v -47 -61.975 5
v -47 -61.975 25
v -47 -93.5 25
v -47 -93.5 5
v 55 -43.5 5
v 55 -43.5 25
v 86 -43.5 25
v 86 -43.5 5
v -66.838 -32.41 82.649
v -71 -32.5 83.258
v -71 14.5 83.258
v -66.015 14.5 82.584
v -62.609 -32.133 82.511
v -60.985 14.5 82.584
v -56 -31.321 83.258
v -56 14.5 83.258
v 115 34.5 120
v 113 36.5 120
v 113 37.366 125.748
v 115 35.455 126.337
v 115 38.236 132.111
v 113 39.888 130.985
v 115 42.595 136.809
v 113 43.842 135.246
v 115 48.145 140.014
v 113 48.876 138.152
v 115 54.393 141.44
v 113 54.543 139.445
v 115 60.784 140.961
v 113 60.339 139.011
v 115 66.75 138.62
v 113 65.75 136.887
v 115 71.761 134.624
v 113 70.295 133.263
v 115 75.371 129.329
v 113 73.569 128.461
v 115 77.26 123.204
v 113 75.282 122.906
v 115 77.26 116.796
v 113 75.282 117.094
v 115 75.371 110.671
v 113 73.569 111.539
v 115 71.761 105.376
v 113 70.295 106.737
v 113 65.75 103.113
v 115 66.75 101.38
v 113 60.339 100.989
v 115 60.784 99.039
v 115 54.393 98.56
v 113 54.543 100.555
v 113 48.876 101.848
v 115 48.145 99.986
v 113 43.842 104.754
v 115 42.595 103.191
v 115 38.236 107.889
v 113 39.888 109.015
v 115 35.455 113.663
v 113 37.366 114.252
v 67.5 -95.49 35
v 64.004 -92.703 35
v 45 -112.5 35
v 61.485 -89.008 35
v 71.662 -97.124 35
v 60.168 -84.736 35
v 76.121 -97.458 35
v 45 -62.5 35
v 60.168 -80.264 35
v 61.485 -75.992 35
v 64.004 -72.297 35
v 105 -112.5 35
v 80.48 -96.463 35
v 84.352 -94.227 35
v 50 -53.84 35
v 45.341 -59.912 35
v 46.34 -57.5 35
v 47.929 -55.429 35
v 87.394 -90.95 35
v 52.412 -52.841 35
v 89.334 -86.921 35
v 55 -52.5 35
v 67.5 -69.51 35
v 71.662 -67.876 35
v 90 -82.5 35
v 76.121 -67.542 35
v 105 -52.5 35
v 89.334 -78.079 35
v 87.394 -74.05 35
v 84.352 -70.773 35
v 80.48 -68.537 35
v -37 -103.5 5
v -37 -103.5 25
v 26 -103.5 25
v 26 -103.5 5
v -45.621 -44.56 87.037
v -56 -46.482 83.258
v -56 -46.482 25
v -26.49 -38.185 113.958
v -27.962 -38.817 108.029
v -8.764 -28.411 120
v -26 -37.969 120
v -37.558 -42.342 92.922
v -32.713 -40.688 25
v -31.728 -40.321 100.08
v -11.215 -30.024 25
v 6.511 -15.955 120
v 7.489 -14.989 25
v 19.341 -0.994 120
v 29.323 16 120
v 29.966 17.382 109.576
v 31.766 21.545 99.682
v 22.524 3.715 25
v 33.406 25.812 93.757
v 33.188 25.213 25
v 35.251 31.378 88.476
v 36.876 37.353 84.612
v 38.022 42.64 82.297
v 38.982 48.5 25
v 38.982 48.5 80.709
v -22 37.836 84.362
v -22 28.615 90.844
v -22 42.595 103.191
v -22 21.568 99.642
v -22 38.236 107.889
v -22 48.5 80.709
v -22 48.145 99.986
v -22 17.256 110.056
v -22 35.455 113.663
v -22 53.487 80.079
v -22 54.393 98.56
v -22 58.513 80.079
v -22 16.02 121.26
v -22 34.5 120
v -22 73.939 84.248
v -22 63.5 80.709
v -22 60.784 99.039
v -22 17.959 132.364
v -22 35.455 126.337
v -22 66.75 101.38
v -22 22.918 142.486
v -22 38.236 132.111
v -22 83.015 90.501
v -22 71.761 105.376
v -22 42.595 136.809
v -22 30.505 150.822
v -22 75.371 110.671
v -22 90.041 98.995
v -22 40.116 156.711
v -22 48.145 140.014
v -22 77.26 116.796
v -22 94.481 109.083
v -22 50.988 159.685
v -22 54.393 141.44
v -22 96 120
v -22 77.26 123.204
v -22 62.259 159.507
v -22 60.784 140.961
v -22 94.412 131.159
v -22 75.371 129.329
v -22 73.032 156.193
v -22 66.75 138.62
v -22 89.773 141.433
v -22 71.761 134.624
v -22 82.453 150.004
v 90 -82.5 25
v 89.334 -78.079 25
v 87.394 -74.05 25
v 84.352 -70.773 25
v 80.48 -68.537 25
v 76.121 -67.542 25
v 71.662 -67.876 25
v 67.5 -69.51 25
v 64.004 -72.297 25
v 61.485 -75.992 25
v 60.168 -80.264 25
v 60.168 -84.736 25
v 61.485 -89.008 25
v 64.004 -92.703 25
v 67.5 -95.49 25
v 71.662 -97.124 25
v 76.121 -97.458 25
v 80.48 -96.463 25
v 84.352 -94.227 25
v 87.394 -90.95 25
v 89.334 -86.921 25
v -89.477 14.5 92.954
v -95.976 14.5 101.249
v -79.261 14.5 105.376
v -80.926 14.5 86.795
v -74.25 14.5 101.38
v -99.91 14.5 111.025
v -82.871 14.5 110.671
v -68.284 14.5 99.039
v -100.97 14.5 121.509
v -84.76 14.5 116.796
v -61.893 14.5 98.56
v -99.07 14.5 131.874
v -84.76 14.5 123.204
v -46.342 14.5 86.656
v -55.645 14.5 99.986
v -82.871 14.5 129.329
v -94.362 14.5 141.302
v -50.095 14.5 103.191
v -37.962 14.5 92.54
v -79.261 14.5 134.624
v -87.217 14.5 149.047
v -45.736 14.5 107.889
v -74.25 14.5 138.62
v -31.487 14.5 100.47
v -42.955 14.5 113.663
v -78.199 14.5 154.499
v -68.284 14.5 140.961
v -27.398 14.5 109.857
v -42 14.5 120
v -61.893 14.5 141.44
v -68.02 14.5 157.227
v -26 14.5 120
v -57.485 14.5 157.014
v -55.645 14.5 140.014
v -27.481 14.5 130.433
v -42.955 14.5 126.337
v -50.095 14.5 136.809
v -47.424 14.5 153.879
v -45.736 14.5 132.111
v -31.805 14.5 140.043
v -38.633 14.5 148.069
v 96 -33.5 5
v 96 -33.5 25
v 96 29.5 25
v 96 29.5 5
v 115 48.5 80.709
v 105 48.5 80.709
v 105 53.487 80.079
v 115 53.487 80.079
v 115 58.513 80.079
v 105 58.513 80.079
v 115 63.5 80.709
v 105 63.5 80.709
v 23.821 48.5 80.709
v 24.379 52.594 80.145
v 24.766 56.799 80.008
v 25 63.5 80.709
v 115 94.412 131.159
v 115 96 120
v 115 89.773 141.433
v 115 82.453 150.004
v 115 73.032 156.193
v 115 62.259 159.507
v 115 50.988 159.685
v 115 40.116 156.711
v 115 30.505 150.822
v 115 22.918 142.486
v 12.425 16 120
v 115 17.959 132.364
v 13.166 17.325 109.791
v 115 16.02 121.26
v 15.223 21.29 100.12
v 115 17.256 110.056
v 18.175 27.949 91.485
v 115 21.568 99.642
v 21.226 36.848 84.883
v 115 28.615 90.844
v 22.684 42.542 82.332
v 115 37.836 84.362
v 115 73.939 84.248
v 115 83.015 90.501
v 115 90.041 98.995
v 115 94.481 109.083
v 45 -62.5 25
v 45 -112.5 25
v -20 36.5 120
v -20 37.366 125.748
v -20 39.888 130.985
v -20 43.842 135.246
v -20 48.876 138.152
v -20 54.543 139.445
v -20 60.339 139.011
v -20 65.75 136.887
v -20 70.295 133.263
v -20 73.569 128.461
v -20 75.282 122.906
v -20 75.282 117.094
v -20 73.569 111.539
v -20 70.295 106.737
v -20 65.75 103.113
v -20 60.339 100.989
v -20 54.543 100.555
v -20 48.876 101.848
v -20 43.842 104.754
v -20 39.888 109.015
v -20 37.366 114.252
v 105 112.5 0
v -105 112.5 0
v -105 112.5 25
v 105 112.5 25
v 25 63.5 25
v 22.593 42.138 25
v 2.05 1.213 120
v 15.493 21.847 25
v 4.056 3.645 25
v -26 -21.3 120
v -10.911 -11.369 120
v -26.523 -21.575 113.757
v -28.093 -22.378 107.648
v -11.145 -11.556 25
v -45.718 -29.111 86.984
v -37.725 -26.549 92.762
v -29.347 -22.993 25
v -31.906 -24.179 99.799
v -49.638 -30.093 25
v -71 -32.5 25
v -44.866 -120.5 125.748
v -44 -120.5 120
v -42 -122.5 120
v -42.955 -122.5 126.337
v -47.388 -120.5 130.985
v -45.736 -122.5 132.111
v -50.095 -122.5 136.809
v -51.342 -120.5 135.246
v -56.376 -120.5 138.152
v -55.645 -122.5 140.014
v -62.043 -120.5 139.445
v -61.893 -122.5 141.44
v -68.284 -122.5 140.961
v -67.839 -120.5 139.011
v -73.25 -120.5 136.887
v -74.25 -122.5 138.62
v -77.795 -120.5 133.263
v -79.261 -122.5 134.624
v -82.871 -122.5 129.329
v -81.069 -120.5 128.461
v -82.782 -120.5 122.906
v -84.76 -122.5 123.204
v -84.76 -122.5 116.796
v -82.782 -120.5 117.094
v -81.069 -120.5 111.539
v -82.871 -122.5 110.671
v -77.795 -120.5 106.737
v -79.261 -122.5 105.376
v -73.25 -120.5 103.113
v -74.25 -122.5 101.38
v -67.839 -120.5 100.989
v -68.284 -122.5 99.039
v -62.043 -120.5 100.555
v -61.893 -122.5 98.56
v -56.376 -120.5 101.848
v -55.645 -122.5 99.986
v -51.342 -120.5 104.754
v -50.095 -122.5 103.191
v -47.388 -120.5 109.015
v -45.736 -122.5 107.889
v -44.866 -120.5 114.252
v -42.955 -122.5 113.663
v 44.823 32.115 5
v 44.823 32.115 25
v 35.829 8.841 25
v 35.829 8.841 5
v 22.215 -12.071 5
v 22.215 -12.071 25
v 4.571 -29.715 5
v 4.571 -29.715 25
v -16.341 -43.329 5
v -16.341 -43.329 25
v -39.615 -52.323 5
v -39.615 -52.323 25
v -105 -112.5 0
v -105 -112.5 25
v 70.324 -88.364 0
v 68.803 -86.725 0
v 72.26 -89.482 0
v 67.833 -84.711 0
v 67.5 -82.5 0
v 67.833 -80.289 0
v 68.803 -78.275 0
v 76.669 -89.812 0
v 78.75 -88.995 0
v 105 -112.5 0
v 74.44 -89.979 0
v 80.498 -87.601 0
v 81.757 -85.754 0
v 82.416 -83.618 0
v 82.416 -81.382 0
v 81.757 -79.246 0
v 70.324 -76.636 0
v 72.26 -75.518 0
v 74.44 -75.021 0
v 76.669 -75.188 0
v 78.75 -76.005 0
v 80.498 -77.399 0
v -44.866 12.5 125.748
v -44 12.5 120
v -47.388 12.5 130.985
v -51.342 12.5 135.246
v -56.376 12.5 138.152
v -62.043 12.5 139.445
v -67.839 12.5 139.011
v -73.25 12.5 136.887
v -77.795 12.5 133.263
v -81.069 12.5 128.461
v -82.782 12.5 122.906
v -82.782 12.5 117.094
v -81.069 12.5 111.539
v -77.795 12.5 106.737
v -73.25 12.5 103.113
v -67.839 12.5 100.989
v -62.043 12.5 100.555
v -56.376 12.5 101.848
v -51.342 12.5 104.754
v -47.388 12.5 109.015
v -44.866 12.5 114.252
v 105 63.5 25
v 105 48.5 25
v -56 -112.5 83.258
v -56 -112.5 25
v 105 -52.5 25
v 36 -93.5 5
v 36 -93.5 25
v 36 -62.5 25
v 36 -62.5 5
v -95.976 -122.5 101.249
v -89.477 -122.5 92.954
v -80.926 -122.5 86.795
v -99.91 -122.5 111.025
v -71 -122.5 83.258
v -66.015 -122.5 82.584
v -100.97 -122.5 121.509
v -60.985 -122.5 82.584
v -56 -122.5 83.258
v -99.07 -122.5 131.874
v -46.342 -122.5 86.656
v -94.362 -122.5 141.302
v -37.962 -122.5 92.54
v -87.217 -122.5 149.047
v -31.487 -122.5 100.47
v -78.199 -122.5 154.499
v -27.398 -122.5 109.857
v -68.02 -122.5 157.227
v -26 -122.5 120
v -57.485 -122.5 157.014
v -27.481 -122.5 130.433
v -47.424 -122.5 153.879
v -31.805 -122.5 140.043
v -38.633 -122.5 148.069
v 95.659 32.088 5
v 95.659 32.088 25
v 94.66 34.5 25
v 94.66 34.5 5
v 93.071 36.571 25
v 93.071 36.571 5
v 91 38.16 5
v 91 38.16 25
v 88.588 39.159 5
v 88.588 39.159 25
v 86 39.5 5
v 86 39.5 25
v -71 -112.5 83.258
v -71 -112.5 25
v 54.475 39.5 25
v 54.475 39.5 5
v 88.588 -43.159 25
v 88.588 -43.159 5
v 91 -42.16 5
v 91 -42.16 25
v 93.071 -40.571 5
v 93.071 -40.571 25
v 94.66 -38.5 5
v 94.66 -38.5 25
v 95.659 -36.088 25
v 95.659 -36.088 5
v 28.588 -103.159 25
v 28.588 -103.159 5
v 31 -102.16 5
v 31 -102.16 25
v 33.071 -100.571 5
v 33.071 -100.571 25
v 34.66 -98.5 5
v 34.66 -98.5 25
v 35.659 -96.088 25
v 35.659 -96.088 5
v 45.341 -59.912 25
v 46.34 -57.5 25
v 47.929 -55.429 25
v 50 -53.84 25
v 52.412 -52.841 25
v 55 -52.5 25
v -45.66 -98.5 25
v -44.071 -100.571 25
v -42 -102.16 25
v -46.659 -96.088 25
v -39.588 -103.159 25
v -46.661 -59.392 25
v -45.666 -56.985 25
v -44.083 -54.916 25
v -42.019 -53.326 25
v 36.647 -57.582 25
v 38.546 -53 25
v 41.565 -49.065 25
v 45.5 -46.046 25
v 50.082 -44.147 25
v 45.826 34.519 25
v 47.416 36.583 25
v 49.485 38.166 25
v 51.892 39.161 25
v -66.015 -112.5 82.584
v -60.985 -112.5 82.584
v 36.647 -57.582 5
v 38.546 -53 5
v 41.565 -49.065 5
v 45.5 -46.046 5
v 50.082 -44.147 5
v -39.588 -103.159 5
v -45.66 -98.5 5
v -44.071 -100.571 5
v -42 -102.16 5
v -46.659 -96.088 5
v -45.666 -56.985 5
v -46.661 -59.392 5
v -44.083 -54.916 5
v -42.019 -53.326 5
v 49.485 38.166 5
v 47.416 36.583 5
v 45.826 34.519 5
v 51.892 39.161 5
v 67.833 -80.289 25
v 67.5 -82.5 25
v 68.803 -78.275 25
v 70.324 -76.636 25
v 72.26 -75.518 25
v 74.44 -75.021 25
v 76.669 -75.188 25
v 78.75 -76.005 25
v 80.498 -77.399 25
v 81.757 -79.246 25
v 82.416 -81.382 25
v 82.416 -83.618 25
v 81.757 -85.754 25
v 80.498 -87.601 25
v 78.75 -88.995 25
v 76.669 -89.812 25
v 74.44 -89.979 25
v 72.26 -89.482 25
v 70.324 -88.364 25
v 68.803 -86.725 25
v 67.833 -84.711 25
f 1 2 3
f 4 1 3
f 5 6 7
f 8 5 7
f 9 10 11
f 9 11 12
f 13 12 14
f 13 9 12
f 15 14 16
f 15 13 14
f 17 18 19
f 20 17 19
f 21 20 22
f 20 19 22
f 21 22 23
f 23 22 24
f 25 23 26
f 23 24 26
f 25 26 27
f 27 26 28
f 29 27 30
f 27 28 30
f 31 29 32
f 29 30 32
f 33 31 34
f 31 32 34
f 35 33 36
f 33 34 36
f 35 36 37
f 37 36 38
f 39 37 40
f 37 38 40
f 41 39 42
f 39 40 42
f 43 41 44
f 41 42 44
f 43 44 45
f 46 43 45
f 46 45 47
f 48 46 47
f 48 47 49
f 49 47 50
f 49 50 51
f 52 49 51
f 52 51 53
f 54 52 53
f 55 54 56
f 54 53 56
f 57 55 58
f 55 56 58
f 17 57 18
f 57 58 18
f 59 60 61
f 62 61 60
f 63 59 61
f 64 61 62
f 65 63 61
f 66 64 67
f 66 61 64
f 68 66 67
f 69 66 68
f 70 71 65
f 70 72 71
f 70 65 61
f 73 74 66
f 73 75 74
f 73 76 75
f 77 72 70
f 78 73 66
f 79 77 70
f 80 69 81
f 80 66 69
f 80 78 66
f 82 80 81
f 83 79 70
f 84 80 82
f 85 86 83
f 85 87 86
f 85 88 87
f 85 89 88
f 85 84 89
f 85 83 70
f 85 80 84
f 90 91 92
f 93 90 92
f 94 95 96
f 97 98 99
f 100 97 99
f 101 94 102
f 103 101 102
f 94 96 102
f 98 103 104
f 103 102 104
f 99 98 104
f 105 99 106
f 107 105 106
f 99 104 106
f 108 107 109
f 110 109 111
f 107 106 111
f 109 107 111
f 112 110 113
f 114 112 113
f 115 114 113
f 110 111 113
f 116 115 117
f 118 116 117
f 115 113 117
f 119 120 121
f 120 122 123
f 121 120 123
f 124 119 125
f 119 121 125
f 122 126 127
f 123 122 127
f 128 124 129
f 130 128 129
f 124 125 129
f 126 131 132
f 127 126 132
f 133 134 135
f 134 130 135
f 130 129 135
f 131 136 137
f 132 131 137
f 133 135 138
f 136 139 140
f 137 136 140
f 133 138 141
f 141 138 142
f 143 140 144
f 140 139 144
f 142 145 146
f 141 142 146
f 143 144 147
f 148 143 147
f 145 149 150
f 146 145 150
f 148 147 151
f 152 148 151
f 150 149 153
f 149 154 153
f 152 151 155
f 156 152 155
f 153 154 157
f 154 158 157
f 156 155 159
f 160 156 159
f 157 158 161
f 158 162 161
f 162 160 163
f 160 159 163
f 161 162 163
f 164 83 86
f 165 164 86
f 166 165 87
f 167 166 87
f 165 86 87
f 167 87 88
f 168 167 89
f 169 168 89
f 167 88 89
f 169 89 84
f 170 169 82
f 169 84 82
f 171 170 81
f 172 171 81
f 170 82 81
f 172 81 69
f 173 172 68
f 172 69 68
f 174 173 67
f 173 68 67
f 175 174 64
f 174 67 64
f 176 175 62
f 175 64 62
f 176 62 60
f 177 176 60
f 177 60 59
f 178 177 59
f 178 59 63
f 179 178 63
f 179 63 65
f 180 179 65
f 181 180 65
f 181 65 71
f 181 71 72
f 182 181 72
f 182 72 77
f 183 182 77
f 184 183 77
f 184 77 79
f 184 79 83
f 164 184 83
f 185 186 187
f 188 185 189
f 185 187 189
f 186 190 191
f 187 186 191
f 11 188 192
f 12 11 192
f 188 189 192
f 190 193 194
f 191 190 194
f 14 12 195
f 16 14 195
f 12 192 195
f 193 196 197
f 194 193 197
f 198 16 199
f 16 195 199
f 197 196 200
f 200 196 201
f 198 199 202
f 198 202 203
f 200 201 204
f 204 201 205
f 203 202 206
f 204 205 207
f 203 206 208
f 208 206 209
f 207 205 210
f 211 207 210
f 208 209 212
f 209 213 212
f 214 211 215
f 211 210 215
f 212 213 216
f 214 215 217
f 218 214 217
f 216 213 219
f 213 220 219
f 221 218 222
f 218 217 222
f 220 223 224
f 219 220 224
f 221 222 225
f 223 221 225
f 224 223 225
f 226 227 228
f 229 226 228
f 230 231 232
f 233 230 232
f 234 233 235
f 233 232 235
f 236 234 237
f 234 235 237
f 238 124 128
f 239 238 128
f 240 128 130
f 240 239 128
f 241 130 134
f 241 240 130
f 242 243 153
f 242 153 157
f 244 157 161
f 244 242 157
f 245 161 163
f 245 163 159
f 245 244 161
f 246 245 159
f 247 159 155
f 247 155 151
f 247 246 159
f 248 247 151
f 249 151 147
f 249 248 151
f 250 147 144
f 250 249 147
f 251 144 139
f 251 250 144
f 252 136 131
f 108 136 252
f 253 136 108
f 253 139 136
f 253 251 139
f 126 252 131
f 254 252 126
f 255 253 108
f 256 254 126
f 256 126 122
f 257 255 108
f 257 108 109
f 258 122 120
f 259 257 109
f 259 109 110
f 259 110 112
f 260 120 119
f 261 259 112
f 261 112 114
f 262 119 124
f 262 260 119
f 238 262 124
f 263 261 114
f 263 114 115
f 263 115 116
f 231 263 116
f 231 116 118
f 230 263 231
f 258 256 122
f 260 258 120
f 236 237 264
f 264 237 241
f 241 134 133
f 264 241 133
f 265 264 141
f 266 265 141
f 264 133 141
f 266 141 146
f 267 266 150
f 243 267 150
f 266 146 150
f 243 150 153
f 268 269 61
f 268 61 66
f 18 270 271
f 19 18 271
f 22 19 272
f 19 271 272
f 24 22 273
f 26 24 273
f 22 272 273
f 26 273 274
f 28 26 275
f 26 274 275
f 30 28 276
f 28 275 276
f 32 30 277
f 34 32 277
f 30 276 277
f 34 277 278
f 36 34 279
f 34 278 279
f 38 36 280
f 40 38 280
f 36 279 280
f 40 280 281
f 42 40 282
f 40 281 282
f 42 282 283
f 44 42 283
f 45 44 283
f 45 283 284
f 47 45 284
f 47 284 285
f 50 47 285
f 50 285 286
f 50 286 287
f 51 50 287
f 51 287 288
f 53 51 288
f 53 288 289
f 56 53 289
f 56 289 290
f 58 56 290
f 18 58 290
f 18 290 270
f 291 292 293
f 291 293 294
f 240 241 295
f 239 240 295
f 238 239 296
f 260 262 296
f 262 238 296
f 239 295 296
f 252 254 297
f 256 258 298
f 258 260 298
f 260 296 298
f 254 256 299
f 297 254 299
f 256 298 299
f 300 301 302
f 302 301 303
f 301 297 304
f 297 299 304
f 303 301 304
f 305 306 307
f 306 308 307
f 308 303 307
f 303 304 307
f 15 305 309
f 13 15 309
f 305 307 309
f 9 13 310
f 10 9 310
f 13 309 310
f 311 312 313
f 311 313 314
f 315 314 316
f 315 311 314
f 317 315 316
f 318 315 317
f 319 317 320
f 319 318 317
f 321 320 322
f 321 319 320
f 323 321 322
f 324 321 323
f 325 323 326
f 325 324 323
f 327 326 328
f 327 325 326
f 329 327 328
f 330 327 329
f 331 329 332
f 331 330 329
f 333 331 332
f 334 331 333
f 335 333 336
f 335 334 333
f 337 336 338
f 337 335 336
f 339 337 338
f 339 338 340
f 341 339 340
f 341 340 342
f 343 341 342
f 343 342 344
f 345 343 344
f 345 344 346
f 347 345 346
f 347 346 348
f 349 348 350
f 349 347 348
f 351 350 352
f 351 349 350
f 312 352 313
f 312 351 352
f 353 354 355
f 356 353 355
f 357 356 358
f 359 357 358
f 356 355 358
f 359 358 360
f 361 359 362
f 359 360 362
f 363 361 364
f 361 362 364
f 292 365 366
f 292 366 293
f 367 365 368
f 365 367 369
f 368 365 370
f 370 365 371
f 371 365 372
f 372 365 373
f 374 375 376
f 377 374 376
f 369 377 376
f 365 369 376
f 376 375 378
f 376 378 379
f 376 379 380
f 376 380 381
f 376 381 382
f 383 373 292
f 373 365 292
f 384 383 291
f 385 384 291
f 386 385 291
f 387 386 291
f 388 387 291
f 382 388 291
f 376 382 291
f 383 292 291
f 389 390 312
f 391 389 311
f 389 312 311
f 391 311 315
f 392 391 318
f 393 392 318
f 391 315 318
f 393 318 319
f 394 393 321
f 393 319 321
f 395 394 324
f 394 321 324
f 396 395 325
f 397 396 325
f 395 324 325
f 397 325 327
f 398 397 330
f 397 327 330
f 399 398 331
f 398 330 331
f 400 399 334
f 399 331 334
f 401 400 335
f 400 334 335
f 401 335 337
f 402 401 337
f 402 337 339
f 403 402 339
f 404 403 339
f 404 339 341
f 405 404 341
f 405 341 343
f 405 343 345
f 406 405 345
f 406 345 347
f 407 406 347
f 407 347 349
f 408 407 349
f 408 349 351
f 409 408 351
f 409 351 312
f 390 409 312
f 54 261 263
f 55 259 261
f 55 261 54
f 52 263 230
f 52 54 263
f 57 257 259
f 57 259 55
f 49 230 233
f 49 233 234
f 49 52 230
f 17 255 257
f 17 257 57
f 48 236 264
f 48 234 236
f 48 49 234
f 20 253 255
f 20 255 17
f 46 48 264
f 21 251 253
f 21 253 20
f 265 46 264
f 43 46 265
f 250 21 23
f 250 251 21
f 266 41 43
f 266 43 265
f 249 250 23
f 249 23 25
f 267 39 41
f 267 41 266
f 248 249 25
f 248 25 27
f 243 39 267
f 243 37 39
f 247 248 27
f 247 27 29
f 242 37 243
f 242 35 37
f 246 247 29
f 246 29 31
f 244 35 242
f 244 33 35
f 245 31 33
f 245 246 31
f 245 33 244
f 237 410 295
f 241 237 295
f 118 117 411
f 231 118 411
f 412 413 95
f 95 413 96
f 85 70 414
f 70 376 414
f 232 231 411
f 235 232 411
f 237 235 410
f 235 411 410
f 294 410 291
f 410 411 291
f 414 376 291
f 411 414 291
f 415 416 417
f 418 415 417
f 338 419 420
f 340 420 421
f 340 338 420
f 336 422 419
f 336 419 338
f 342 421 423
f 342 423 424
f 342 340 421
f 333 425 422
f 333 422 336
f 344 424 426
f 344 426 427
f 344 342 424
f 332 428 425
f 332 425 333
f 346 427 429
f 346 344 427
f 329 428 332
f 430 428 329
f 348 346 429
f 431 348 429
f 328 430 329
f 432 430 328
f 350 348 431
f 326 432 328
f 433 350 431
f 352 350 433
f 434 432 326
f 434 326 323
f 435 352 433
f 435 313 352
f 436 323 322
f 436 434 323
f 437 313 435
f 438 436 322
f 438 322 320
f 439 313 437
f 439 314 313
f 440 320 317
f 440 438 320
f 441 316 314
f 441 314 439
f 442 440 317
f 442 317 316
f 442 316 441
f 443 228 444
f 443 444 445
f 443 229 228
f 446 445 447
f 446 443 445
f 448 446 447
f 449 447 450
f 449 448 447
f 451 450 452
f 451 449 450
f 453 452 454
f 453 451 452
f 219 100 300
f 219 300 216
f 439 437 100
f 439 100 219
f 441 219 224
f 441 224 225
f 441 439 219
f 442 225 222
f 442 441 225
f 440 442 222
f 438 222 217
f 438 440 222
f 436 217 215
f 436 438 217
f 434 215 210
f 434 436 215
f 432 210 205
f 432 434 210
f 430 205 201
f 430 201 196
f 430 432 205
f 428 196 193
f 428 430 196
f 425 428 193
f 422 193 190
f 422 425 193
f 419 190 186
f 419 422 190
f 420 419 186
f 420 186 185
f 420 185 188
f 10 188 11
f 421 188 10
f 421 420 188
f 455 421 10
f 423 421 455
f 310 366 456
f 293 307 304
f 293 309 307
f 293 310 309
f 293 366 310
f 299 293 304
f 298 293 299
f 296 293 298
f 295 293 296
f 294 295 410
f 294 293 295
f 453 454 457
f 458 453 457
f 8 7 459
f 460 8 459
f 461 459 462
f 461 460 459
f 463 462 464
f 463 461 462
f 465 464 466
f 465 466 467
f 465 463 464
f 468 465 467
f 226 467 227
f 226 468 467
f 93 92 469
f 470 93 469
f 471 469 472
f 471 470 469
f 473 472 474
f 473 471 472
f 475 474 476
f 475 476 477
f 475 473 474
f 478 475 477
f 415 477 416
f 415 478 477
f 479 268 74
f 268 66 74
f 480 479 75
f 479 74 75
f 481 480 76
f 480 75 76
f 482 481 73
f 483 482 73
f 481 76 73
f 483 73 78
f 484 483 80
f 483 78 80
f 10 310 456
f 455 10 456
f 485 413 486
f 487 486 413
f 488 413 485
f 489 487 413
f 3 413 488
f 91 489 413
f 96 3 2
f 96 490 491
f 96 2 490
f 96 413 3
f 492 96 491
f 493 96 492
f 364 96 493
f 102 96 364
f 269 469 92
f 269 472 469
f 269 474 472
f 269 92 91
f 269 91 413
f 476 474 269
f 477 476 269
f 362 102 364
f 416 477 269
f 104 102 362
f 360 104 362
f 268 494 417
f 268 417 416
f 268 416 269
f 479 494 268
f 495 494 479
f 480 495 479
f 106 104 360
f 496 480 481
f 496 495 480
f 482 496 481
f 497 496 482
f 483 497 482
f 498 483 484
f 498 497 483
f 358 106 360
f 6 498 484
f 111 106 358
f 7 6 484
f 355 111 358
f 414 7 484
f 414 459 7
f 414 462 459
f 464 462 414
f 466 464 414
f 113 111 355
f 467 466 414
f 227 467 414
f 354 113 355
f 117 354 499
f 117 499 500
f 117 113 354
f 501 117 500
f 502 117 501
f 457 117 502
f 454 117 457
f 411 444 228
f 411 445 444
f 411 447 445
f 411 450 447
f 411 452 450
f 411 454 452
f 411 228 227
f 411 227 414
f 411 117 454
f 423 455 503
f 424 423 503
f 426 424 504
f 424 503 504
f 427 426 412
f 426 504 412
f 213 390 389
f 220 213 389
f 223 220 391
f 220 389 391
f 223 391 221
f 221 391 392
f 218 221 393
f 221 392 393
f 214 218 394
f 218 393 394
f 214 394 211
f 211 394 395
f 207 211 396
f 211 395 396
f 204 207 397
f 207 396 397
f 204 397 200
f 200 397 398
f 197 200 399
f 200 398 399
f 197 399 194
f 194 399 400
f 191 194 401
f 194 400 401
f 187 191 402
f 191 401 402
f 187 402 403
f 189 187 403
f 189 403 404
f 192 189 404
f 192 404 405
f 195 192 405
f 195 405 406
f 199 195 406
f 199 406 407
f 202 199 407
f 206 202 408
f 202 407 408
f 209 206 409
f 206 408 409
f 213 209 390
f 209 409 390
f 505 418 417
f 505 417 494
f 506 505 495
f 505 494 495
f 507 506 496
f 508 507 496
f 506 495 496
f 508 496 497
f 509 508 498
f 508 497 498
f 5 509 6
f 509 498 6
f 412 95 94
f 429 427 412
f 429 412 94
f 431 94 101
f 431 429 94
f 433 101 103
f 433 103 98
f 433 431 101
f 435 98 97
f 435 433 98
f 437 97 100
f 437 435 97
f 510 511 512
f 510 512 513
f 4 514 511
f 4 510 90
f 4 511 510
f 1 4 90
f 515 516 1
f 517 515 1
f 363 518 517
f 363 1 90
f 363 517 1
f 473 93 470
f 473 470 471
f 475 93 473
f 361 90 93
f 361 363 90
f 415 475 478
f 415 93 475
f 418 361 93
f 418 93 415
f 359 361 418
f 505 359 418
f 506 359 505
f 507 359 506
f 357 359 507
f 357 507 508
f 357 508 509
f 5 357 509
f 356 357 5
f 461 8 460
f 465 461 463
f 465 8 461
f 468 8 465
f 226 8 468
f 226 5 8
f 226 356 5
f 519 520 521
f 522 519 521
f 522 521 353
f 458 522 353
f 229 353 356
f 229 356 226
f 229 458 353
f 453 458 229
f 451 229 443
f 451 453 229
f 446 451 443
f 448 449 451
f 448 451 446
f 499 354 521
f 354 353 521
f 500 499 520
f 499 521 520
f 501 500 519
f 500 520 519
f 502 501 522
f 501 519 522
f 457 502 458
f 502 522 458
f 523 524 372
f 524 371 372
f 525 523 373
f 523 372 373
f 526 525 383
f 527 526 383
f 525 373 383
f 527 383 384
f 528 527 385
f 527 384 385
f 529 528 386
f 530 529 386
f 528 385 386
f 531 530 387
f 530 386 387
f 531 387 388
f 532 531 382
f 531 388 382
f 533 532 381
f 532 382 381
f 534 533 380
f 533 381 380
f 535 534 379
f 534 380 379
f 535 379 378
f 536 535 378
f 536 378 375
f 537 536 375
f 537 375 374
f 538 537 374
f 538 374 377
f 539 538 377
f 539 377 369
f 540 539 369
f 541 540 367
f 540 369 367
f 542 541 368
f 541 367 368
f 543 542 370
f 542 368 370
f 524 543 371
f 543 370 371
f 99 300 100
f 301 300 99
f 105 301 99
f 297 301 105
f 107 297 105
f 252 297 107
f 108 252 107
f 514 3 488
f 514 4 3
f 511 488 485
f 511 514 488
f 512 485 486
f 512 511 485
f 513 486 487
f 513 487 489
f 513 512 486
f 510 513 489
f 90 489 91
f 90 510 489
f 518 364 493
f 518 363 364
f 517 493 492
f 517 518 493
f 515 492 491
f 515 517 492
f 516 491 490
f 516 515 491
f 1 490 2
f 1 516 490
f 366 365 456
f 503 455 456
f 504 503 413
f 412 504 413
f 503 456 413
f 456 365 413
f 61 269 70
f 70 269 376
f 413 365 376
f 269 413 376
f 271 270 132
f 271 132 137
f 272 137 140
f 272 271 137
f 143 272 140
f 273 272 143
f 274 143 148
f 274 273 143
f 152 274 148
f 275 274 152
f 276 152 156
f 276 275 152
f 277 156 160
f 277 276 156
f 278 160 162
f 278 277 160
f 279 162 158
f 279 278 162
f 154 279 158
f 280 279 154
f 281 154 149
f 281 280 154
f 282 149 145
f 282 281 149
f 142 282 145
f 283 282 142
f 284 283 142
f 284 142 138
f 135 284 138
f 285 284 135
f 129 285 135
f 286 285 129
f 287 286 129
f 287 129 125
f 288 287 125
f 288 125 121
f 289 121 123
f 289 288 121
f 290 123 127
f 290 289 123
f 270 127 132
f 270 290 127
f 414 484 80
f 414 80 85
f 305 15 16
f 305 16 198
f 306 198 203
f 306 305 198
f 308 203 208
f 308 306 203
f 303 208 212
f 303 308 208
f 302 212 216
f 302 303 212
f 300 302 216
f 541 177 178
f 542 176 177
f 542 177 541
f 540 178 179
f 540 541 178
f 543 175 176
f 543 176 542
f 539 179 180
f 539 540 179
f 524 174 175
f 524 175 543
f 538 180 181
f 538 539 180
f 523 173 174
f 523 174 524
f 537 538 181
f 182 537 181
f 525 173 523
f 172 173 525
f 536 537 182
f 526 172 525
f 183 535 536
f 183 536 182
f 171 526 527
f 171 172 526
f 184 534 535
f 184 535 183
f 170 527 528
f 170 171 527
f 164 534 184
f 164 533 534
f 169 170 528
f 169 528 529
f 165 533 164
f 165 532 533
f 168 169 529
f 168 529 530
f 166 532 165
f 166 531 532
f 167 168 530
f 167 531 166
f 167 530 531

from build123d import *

# Parameters (mm, degrees)
F0_W            = 210
F0_H            = 225
F1_DEPTH        = 25
F3_DEPTH        = 95
F5_DEPTH        = 10
F5_DEPTH_BACK   = 127
F7_DEPTH        = 10
F7_DEPTH_BACK   = 127
F8_W            = 60
F8_H            = 60
F9_DEPTH        = 10
F10_R           = 10
F12_DEPTH       = 20
F14_D           = 15
F14_CBORE_D     = 30
F14_CBORE_DEPTH = 10
F15_R           = 10
F16_R           = 19.5
F17_DEPTH       = 235.001
F18_R           = 19.5
F19_DEPTH       = 137.0010001
F20_SIZE        = 2


with BuildPart() as f1:
    # F0 (on Top) → F1 (new body)
    with BuildSketch(Plane.XY):
        Rectangle(F0_W, F0_H)
    extrude(amount=F1_DEPTH)

    # F2 (on face) → F3 (join)
    with BuildSketch(Plane.XY.offset(25)):
        with BuildLine():
            Line((-71, -32.5), (-71, -112.5))
            Line((-71, -112.5), (-56, -112.5))
            Line((-56, -112.5), (-56, -46.4818166789))
            ThreePointArc((-56, -46.4818166789), (7.4888527117, -14.9888527117), (38.9818166789, 48.5))
            Line((38.9818166789, 48.5), (105, 48.5))
            Line((105, 48.5), (105, 63.5))
            Line((105, 63.5), (25, 63.5))
            ThreePointArc((25, 63.5), (-3.1177490061, -4.3822509939), (-71, -32.5))
        make_face()
    extrude(amount=F3_DEPTH)

    # F4 (on face) → F5 (join, two sides)
    with BuildSketch(Plane.XZ.offset(112.5)) as f5_sk:
        with BuildLine():
            ThreePointArc((-56, 83.2576538583), (-34.4526249034, 96.2829175487), (-26, 120))
            ThreePointArc((-26, 120), (-87.2170824513, 149.0473750966), (-71, 83.2576538583))
            Line((-71, 83.2576538583), (-71, 120))
            Line((-71, 120), (-56, 120))
            Line((-56, 120), (-56, 83.2576538583))
        make_face()
        with BuildLine():
            Line((-71, 120), (-71, 83.2576538583))
            ThreePointArc((-71, 83.2576538583), (-63.5, 82.5), (-56, 83.2576538583))
            Line((-56, 83.2576538583), (-56, 120))
            Line((-56, 120), (-71, 120))
        make_face()
    extrude(amount=F5_DEPTH)
    extrude(f5_sk.sketch, amount=-F5_DEPTH_BACK)

    # F6 (on face) → F7 (join, two sides)
    with BuildSketch(Plane.YZ.offset(105)) as f7_sk:
        with BuildLine():
            ThreePointArc((63.5, 80.7094158862), (86.8220700148, 94.504902432), (96, 120))
            ThreePointArc((96, 120), (30.504902432, 150.8220700148), (48.5, 80.7094158862))
            Line((48.5, 80.7094158862), (48.5, 120))
            Line((48.5, 120), (63.5, 120))
            Line((63.5, 120), (63.5, 80.7094158862))
        make_face()
        with BuildLine():
            Line((48.5, 120), (48.5, 80.7094158862))
            ThreePointArc((48.5, 80.7094158862), (56, 80), (63.5, 80.7094158862))
            Line((63.5, 80.7094158862), (63.5, 120))
            Line((63.5, 120), (48.5, 120))
        make_face()
    extrude(amount=F7_DEPTH)
    extrude(f7_sk.sketch, amount=-F7_DEPTH_BACK)

    # F8 (on face) → F9 (join)
    with BuildSketch(Plane.XY.offset(25)):
        with Locations((75, -82.5)):
            Rectangle(F8_W, F8_H)
    extrude(amount=F9_DEPTH)

    # F10
    f10_edges = [f1.edges().sort_by_distance(p)[0] for p in [
        (45, -52.5, 30),
    ]]
    fillet(f10_edges, radius=F10_R)

    # F11 (on face) → F12 (cut)
    with BuildSketch(Plane.XY.offset(25)):
        with BuildLine():
            ThreePointArc((46.5755076536, 39.5), (13.8528137424, -21.3528137424), (-47, -54.0755076536))
            Line((-47, -54.0755076536), (-47, -103.5))
            Line((-47, -103.5), (36, -103.5))
            Line((36, -103.5), (36, -62.5))
            ThreePointArc((36, -62.5), (41.5649711575, -49.0649711575), (55, -43.5))
            Line((55, -43.5), (96, -43.5))
            Line((96, -43.5), (96, 39.5))
            Line((96, 39.5), (46.5755076536, 39.5))
        make_face()
    extrude(amount=-F12_DEPTH, mode=Mode.SUBTRACT)

    # F14 (through all)
    with Locations(Plane.XY.offset(35)):
        with Locations((75, -82.5)):
            CounterBoreHole(F14_D / 2, F14_CBORE_D / 2, F14_CBORE_DEPTH)

    # F15
    f15_edges = [f1.edges().sort_by_distance(p)[0] for p in [
        (-47, -54.075508, 15),
        (-47, -103.5, 15),
        (36, -103.5, 15),
        (46.575508, 39.5, 15),
        (96, 39.5, 15),
        (96, -43.5, 15),
    ]]
    fillet(f15_edges, radius=F15_R)

    # F16 (on face) → F17 (cut, through all)
    with BuildSketch(Plane.XZ.offset(122.5)):
        with Locations((-63.5, 120)):
            Circle(F16_R)
    extrude(amount=-F17_DEPTH, mode=Mode.SUBTRACT)

    # F18 (on face) → F19 (cut, through all)
    with BuildSketch(Plane(origin=(-22, 0, 0), x_dir=(0, -1, 0), z_dir=(-1, 0, 0))):
        with Locations((-56, 120)):
            Circle(F18_R)
    extrude(amount=-F19_DEPTH, mode=Mode.SUBTRACT)

    # F20
    f20_edges = [f1.edges().sort_by_distance(p)[0] for p in [
        (-22, 75.5, 120),
        (-83, 14.5, 120),
        (-83, -122.5, 120),
        (115, 75.5, 120),
    ]]
    chamfer(f20_edges, length=F20_SIZE)


solid = f1.part
